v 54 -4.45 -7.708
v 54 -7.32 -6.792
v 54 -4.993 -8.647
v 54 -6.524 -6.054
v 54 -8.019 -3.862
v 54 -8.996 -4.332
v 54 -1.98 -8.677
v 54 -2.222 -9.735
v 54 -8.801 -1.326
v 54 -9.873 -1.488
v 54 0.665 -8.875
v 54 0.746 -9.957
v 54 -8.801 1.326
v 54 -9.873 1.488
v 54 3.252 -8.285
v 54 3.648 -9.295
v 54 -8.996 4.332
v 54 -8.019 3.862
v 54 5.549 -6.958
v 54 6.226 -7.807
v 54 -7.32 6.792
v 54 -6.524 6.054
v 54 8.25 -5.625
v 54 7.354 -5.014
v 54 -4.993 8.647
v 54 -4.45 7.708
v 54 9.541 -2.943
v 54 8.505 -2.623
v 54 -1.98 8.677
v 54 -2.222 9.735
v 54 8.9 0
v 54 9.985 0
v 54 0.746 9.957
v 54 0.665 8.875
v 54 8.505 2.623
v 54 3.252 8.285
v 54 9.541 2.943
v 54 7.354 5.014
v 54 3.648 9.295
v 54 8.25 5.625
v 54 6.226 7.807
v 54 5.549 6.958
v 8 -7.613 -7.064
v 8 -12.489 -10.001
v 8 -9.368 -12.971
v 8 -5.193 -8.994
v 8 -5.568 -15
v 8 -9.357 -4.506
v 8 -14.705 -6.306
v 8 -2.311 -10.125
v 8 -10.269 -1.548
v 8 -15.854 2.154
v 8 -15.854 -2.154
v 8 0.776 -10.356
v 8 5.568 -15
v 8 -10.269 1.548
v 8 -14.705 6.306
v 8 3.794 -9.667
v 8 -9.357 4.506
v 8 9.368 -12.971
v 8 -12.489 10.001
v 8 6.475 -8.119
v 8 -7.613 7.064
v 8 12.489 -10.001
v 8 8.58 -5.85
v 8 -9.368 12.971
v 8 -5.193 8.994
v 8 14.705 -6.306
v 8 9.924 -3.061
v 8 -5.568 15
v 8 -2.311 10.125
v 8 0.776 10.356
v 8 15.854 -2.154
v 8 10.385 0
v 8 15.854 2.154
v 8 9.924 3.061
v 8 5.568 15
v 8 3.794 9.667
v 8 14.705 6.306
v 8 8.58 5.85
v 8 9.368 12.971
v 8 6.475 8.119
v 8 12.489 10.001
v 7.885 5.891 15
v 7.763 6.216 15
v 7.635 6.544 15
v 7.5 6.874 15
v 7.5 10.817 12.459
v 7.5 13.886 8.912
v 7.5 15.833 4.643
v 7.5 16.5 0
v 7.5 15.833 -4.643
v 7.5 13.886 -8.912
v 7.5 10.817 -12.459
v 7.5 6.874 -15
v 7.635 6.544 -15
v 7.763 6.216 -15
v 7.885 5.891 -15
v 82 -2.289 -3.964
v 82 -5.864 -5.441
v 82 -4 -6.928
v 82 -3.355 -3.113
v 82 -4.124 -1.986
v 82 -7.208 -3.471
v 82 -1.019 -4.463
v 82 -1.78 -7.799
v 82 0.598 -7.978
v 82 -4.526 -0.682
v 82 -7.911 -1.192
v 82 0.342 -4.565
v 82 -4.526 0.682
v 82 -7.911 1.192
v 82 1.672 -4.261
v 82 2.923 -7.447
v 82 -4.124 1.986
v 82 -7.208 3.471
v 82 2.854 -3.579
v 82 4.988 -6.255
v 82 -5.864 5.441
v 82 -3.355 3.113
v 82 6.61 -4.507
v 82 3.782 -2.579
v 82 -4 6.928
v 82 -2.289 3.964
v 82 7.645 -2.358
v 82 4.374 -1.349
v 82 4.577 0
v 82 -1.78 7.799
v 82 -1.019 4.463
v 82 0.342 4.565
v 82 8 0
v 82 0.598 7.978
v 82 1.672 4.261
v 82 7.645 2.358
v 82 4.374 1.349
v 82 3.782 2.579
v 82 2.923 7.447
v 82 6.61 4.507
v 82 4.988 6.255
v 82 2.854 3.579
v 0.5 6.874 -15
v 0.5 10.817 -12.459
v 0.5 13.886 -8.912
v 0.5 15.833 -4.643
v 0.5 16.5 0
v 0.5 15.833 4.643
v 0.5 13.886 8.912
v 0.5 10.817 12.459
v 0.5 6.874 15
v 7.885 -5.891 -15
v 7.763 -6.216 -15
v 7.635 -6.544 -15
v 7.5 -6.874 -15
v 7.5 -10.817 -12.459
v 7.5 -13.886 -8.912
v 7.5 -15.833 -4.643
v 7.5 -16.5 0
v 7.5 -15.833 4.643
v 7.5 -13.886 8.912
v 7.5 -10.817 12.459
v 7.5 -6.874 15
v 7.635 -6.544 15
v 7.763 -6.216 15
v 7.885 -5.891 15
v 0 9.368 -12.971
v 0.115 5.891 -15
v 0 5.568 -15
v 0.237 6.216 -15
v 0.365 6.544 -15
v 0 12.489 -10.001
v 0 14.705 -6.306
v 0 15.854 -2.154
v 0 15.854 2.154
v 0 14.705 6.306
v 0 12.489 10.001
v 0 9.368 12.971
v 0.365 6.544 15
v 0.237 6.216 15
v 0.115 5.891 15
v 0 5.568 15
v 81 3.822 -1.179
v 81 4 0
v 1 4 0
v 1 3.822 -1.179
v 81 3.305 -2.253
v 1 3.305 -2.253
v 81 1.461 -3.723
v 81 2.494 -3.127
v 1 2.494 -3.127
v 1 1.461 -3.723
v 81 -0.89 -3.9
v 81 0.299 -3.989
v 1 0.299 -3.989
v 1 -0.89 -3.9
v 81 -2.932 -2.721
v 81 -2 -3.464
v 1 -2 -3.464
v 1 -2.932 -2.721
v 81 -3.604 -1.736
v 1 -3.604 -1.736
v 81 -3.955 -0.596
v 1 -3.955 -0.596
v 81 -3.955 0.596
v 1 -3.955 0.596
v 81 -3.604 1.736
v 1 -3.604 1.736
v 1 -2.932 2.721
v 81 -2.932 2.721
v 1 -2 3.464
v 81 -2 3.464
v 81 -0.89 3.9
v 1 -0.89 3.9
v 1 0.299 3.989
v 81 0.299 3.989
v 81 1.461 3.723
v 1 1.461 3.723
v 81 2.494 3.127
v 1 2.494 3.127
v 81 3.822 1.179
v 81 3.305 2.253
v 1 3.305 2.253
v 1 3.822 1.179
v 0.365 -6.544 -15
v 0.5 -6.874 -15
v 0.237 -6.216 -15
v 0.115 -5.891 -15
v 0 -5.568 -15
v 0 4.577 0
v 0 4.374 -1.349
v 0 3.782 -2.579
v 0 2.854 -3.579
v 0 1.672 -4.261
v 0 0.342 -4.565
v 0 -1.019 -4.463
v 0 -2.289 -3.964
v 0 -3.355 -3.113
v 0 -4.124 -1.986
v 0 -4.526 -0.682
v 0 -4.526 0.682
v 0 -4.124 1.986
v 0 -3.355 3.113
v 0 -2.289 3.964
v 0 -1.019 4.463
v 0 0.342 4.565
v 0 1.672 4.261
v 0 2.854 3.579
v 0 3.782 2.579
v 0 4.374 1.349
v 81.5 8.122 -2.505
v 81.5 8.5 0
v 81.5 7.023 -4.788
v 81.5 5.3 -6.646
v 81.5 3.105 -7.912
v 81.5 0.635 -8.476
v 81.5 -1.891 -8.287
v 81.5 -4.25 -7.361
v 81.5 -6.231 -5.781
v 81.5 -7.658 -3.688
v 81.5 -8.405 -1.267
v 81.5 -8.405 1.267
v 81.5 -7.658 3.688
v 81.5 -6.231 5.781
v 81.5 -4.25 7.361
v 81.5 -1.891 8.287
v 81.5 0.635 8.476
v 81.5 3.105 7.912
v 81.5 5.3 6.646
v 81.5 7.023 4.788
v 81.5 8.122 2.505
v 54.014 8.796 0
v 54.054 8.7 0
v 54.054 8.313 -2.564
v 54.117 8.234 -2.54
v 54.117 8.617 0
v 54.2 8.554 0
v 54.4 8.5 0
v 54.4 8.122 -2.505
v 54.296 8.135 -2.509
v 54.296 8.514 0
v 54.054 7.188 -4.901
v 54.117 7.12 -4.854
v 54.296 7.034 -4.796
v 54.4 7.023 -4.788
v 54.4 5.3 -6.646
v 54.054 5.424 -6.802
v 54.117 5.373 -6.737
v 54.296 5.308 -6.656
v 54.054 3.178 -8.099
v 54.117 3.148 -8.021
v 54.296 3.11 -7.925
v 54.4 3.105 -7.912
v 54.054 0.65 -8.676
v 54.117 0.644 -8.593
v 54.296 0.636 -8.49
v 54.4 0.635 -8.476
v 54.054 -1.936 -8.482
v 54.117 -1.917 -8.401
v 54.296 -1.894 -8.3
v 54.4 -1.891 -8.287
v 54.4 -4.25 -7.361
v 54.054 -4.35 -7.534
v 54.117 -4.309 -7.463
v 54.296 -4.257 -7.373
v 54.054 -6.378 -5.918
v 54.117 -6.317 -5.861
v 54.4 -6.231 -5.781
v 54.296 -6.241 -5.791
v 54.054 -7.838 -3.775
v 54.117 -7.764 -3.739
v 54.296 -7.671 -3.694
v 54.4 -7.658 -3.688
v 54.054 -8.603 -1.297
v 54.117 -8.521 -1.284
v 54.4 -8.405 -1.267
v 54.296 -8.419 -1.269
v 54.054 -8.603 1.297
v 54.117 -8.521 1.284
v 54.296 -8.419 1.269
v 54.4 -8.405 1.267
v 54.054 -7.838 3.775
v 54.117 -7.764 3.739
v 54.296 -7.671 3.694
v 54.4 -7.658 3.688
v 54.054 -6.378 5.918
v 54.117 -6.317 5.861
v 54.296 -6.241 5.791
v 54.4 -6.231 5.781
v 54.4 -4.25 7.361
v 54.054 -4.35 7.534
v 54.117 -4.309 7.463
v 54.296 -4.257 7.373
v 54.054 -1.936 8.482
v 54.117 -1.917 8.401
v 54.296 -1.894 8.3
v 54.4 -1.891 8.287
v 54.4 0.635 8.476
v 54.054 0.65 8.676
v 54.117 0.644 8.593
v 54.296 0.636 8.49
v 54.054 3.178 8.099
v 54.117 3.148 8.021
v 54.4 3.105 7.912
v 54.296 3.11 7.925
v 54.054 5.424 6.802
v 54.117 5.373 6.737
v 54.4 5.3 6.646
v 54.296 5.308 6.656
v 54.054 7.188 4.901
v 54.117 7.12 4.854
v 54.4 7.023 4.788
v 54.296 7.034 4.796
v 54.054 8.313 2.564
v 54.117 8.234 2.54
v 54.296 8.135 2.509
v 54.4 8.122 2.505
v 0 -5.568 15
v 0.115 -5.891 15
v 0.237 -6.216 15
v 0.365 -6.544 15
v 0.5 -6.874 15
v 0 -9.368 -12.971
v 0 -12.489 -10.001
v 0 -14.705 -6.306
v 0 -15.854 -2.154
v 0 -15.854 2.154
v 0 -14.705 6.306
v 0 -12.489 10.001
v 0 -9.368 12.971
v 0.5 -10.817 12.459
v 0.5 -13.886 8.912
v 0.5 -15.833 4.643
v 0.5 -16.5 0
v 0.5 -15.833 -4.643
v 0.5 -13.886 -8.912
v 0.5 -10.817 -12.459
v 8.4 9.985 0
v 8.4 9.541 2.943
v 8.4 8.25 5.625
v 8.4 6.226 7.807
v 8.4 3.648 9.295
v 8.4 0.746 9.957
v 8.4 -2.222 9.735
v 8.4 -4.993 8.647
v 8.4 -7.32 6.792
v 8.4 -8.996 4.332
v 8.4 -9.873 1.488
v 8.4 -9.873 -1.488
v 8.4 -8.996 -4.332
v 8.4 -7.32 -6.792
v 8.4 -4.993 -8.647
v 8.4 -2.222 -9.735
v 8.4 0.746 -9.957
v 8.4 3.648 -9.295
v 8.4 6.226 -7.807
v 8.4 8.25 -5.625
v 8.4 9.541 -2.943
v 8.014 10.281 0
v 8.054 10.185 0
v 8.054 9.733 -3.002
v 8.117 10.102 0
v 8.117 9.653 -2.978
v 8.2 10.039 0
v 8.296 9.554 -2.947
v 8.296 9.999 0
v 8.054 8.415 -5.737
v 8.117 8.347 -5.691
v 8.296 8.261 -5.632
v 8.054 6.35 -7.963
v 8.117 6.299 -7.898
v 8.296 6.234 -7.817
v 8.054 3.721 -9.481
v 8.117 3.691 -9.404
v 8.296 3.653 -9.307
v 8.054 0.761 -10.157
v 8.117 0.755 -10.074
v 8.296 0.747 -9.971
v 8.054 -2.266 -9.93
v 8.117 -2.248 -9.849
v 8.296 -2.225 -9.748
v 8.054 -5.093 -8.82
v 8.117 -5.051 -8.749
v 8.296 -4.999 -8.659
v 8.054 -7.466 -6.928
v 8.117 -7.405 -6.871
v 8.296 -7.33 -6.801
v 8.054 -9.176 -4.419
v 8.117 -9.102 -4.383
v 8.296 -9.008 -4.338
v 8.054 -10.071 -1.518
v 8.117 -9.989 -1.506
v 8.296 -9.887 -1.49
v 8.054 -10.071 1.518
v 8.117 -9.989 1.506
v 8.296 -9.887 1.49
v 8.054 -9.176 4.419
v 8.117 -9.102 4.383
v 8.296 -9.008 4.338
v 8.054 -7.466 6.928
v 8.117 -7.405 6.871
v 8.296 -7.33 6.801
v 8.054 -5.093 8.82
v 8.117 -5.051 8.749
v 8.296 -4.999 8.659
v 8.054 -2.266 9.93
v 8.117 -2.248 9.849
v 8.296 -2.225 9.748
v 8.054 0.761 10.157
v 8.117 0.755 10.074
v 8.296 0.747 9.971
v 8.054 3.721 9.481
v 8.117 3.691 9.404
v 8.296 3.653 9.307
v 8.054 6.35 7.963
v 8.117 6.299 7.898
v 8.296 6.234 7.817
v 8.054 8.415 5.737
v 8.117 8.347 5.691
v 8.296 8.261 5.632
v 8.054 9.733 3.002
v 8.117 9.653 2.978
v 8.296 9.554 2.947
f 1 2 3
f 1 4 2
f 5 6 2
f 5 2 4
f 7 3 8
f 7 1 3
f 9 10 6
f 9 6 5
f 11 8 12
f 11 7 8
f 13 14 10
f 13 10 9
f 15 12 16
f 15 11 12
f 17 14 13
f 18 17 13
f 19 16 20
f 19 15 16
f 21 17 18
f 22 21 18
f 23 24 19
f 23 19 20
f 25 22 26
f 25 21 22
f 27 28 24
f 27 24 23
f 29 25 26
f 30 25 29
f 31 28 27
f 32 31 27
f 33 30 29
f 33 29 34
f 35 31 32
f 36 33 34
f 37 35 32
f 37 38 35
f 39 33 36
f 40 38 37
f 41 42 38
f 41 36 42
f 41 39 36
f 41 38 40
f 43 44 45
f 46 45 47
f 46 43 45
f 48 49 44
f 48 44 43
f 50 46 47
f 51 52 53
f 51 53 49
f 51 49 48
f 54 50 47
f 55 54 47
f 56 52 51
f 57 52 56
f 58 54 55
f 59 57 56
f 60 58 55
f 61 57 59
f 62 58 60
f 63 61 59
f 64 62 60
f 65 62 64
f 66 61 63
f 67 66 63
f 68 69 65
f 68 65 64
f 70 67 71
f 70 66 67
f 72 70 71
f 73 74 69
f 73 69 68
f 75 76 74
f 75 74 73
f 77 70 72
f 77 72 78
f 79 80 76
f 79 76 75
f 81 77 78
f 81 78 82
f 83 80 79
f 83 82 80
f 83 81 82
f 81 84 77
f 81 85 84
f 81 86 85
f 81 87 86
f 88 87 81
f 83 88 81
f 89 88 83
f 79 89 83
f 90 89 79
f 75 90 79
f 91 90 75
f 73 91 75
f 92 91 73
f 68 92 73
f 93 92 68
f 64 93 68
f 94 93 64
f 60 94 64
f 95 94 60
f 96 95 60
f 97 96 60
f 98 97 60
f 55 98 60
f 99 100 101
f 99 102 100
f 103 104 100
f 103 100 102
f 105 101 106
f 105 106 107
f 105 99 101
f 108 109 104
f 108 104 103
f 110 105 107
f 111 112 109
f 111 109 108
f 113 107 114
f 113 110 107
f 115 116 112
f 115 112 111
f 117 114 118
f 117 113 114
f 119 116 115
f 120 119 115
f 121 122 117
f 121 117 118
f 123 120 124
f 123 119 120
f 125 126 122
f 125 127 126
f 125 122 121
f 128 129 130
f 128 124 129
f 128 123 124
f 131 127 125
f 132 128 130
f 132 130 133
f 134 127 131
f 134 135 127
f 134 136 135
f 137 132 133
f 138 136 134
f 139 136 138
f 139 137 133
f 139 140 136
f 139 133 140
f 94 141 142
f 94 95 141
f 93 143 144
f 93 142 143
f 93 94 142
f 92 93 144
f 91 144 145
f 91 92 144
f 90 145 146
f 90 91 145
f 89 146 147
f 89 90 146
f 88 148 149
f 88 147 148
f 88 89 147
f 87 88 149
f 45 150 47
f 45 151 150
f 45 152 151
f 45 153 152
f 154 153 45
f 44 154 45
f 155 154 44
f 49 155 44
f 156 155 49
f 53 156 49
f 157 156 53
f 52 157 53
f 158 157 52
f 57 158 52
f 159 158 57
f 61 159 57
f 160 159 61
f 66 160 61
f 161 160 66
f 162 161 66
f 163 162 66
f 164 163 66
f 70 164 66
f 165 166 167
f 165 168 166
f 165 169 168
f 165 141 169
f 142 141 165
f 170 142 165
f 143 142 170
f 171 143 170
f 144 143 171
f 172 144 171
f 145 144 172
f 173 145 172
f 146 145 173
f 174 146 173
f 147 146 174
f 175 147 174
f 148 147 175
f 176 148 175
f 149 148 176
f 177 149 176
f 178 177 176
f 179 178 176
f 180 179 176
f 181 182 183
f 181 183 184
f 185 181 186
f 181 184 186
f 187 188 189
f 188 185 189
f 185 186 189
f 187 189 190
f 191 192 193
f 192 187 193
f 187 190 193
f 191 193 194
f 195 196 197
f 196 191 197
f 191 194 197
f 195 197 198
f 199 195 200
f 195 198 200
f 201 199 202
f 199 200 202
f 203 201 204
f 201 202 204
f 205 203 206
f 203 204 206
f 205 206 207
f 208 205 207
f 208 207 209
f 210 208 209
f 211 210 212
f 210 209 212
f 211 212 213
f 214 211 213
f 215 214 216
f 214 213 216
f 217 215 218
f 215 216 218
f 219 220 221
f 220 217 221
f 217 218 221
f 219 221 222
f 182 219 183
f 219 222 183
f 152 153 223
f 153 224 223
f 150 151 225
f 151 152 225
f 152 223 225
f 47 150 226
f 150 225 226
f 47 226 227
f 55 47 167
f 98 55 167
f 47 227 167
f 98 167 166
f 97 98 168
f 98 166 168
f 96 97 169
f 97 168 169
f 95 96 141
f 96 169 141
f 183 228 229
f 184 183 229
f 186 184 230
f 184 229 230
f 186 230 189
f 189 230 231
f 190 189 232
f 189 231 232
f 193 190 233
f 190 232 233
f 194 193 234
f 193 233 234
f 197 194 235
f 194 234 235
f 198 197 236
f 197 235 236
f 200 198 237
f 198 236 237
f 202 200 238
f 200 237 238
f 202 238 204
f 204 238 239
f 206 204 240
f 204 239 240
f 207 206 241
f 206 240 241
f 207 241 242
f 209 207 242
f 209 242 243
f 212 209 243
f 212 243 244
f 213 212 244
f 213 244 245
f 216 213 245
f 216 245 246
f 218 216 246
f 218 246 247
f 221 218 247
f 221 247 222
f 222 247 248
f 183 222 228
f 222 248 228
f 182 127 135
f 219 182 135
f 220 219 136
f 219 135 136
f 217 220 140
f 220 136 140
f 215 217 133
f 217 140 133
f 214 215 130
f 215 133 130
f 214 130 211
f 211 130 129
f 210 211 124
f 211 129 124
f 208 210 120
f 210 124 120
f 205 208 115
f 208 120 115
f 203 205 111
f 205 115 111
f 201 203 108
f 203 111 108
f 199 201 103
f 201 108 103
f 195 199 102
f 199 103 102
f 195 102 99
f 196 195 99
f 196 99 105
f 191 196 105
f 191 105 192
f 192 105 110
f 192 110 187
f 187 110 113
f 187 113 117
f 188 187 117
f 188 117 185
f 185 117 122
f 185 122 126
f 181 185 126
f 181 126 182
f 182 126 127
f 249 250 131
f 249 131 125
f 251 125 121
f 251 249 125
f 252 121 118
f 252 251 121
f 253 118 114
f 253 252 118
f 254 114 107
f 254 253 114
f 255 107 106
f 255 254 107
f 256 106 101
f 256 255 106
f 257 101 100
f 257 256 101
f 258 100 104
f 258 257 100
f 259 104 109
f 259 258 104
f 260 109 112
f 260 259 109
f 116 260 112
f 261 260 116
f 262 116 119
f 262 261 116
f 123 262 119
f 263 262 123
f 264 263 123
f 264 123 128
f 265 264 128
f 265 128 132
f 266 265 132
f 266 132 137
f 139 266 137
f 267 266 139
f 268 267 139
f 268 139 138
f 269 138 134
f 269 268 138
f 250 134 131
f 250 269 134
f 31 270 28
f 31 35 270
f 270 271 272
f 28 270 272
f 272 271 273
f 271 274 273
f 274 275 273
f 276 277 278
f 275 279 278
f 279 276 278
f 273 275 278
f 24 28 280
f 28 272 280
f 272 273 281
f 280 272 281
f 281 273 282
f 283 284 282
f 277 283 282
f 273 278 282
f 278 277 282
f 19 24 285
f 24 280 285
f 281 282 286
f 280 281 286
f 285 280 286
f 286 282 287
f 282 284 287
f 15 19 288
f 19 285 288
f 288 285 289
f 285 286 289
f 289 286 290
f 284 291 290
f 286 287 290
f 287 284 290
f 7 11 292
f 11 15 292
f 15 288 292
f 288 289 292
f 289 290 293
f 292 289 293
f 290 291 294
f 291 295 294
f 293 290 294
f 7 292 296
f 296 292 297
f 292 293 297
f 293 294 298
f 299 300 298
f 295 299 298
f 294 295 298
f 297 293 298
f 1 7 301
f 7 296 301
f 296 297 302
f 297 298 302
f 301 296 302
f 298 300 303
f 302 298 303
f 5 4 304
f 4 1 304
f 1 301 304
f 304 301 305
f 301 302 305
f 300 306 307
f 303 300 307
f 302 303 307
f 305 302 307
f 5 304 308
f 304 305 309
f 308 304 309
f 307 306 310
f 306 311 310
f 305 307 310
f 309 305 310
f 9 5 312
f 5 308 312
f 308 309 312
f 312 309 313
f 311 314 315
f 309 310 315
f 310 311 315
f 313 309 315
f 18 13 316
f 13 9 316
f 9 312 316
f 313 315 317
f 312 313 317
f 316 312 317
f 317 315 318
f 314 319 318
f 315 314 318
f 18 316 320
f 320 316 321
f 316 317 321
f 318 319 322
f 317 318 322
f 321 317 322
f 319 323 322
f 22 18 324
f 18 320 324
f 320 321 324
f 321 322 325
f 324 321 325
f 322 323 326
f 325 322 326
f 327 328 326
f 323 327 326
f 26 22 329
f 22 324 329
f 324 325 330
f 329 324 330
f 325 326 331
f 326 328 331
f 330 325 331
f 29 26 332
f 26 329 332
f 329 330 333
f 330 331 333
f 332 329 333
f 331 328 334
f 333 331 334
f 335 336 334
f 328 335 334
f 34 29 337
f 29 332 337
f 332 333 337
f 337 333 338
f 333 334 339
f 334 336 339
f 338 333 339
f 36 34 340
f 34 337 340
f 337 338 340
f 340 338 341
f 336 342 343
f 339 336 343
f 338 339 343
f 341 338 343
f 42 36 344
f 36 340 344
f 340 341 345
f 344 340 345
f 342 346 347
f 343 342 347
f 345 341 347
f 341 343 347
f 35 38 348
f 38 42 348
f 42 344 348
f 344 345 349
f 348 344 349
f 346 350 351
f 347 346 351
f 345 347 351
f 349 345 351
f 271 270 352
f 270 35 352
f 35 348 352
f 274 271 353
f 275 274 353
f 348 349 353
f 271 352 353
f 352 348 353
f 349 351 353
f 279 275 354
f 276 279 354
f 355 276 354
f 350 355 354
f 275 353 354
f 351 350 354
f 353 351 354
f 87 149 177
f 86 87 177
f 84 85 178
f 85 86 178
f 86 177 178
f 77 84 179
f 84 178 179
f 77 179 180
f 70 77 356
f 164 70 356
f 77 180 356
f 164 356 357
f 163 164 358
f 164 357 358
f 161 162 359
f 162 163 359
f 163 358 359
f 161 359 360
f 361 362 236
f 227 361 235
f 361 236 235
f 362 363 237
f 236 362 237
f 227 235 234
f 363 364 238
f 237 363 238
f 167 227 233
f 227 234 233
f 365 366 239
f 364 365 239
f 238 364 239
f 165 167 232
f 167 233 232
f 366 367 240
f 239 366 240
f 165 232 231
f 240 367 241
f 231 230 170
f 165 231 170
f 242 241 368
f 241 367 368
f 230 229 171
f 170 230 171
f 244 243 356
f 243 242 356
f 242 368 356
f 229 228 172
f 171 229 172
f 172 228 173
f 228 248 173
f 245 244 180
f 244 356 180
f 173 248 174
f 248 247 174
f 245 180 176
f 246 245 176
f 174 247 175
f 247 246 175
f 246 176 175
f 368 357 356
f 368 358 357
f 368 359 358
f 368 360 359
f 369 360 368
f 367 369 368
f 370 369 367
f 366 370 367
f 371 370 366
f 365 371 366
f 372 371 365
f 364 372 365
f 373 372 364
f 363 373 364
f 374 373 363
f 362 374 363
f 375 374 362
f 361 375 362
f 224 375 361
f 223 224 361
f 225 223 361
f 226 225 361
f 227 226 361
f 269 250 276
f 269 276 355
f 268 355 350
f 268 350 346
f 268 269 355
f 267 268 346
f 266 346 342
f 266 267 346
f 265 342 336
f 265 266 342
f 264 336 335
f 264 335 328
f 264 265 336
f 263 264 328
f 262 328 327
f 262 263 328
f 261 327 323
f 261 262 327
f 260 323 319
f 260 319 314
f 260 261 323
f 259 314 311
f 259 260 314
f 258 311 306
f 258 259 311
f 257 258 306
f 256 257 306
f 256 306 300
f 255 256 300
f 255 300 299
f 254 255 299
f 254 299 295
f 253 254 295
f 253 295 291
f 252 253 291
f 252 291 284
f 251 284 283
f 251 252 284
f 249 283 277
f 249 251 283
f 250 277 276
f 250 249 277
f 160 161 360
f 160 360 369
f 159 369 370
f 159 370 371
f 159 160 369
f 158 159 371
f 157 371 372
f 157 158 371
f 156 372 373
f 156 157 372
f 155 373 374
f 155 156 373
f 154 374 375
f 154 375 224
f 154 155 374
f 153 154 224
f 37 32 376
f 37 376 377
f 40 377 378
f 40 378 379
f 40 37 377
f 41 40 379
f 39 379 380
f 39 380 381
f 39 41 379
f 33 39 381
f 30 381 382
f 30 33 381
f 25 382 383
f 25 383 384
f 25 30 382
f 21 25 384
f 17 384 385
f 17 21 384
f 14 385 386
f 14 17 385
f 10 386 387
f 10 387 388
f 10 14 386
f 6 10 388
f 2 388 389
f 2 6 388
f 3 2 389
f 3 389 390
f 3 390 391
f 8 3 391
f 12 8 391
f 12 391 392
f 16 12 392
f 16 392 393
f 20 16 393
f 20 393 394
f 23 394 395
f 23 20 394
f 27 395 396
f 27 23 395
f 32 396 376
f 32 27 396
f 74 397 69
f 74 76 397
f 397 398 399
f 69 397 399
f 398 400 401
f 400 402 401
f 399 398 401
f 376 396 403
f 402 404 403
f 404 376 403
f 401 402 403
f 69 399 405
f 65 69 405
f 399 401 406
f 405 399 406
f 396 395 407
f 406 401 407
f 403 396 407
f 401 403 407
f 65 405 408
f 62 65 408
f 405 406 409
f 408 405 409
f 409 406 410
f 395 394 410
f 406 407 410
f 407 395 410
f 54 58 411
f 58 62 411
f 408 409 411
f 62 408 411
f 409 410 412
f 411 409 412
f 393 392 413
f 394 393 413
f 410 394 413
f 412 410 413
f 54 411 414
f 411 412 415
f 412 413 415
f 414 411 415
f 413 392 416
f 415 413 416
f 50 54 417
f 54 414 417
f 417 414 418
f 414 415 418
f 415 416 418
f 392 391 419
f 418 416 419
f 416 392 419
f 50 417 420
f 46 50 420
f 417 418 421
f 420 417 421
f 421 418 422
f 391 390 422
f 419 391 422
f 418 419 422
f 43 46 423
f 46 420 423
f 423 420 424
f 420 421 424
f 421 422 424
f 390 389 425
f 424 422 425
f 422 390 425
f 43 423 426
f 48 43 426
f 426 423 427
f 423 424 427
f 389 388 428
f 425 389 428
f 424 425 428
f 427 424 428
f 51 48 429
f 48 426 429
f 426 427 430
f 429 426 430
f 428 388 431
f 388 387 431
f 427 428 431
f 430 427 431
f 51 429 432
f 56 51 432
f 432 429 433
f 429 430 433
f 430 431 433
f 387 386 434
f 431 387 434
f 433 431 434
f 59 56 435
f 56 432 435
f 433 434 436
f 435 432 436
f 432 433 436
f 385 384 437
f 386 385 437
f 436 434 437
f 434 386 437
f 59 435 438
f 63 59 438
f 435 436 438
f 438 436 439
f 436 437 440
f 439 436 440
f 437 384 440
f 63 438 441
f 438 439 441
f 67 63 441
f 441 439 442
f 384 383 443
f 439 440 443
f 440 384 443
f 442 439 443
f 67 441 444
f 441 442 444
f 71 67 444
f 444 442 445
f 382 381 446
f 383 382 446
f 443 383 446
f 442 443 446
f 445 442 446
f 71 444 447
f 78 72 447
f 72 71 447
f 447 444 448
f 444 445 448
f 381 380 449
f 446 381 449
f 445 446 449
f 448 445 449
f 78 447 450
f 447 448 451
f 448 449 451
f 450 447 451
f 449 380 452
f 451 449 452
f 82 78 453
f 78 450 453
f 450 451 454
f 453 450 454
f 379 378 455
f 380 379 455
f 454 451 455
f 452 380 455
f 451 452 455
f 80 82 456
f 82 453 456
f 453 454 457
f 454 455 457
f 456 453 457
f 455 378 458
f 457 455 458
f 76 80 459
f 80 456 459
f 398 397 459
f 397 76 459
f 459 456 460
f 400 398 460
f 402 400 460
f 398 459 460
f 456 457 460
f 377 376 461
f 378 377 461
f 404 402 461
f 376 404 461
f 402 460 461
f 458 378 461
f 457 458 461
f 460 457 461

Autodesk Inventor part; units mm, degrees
ref_plane "YZ Plane" through (0, 0, 0) normal (1, 0, 0) x (0, 1, 0)
ref_plane "XZ Plane" through (0, 0, 0) normal (0, 1, 0) x (-1, 0, 0)
ref_plane "XY Plane" through (0, 0, 0) normal (0, 0, 1) x (1, 0, 0)
sketch "Náčrt1" plane through (0, 0, 0) normal (0, 0, 1) x (1, 0, 0)
  line L0 (0, 0) -> (19.1477, 0)
  line L1 (0, 4) -> (0, 16.5)
  line L2 (0, 16.5) -> (8, 16.5)
  line L3 (8, 16.5) -> (8, 10.385)
  line L4 (8.4, 9.985) -> (54, 9.985)
  line L5 (54, 9.985) -> (54, 8.9)
  line L6 (54.4, 8.5) -> (82, 8.5)
  line L7 (82, 8.5) -> (82, 4)
  line L8 (82, 4) -> (0, 4)
  arc A0 (8, 10.385) -> (8.4, 9.985) centre (8.4, 10.385) ccw
  arc A1 (54, 8.9) -> (54.4, 8.5) centre (54.4, 8.9) ccw
  point P0 (54, 8.5)
  point P1 (8, 9.985)
  dimension "d0" = 33
  dimension "d1" = 82
  dimension "d2" = 28
  dimension "d5" = 17
  dimension "d6" = 8
  dimension "d7" = 19.97
  dimension "d8" = 74
  dimension "d39" = 8
  dimension "d40" = 46
  dimension "d41" = 0.4
  dimension "d42" = 0.4
revolve "Rotace1" add sketch "Náčrt1" angle 360 about axis through (0, 0, 0) along (1, 0, 0)
thread "Závit1" size "M17x1" class "6g" standard "ANSI Metric M Profile" length 15
chamfer "Zkosení1" distance 0.5 angle 45 1 edges at (0, -16.5, 0)
chamfer "Zkosení2" distance 0.5 angle 45 1 edges at (8, -16.5, 0)
chamfer "Zkosení3" distance 1 angle 30 1 edges at (0, -4, 0) measured on face at (54.6667, 3.987, -0.3219)
chamfer "Zkosení4" distance 1 angle 30 1 edges at (82, -4, 0) measured on face at (55, 3.987, -0.3219)
chamfer "Zkosení5" distance 0.5 angle 45 1 edges at (82, -8.5, 0)
sketch "Náčrt2" plane through (0, 0, 0) normal (-1, 0, 0) x (0, 0, 1)
  line L0 (-15, 6.8739) -> (-17.8524, 6.8739)
  line L1 (-17.8524, 6.8739) -> (-17.8524, -6.8739)
  line L2 (-17.8524, -6.8739) -> (-15, -6.8739)
  line L3 (-15, -6.8739) -> (-15, 6.8739)
  line L4 (19.6486, 6.8739) -> (15, 6.8739)
  line L5 (15, 6.8739) -> (15, -6.8739)
  line L6 (15, -6.8739) -> (19.6486, -6.8739)
  line L7 (19.6486, -6.8739) -> (19.6486, 6.8739)
  line L8 (0, 0) -> (0, -4.618) construction
  circle A0 centre (0, 0) radius 16.5 construction
  dimension "d29" = 30
extrude "Vysunutí1" cut sketch "Náčrt2" against normal through all
equation "\"Rozmer_A\" = d0"
equation "\"Rozmer_B\" = 0"
equation "\"Rozmer_C\" = 0"
equation "\"Rozmer_D\" = d1"
properties part number "NA-45-h-Crown-277" material "16 341"
